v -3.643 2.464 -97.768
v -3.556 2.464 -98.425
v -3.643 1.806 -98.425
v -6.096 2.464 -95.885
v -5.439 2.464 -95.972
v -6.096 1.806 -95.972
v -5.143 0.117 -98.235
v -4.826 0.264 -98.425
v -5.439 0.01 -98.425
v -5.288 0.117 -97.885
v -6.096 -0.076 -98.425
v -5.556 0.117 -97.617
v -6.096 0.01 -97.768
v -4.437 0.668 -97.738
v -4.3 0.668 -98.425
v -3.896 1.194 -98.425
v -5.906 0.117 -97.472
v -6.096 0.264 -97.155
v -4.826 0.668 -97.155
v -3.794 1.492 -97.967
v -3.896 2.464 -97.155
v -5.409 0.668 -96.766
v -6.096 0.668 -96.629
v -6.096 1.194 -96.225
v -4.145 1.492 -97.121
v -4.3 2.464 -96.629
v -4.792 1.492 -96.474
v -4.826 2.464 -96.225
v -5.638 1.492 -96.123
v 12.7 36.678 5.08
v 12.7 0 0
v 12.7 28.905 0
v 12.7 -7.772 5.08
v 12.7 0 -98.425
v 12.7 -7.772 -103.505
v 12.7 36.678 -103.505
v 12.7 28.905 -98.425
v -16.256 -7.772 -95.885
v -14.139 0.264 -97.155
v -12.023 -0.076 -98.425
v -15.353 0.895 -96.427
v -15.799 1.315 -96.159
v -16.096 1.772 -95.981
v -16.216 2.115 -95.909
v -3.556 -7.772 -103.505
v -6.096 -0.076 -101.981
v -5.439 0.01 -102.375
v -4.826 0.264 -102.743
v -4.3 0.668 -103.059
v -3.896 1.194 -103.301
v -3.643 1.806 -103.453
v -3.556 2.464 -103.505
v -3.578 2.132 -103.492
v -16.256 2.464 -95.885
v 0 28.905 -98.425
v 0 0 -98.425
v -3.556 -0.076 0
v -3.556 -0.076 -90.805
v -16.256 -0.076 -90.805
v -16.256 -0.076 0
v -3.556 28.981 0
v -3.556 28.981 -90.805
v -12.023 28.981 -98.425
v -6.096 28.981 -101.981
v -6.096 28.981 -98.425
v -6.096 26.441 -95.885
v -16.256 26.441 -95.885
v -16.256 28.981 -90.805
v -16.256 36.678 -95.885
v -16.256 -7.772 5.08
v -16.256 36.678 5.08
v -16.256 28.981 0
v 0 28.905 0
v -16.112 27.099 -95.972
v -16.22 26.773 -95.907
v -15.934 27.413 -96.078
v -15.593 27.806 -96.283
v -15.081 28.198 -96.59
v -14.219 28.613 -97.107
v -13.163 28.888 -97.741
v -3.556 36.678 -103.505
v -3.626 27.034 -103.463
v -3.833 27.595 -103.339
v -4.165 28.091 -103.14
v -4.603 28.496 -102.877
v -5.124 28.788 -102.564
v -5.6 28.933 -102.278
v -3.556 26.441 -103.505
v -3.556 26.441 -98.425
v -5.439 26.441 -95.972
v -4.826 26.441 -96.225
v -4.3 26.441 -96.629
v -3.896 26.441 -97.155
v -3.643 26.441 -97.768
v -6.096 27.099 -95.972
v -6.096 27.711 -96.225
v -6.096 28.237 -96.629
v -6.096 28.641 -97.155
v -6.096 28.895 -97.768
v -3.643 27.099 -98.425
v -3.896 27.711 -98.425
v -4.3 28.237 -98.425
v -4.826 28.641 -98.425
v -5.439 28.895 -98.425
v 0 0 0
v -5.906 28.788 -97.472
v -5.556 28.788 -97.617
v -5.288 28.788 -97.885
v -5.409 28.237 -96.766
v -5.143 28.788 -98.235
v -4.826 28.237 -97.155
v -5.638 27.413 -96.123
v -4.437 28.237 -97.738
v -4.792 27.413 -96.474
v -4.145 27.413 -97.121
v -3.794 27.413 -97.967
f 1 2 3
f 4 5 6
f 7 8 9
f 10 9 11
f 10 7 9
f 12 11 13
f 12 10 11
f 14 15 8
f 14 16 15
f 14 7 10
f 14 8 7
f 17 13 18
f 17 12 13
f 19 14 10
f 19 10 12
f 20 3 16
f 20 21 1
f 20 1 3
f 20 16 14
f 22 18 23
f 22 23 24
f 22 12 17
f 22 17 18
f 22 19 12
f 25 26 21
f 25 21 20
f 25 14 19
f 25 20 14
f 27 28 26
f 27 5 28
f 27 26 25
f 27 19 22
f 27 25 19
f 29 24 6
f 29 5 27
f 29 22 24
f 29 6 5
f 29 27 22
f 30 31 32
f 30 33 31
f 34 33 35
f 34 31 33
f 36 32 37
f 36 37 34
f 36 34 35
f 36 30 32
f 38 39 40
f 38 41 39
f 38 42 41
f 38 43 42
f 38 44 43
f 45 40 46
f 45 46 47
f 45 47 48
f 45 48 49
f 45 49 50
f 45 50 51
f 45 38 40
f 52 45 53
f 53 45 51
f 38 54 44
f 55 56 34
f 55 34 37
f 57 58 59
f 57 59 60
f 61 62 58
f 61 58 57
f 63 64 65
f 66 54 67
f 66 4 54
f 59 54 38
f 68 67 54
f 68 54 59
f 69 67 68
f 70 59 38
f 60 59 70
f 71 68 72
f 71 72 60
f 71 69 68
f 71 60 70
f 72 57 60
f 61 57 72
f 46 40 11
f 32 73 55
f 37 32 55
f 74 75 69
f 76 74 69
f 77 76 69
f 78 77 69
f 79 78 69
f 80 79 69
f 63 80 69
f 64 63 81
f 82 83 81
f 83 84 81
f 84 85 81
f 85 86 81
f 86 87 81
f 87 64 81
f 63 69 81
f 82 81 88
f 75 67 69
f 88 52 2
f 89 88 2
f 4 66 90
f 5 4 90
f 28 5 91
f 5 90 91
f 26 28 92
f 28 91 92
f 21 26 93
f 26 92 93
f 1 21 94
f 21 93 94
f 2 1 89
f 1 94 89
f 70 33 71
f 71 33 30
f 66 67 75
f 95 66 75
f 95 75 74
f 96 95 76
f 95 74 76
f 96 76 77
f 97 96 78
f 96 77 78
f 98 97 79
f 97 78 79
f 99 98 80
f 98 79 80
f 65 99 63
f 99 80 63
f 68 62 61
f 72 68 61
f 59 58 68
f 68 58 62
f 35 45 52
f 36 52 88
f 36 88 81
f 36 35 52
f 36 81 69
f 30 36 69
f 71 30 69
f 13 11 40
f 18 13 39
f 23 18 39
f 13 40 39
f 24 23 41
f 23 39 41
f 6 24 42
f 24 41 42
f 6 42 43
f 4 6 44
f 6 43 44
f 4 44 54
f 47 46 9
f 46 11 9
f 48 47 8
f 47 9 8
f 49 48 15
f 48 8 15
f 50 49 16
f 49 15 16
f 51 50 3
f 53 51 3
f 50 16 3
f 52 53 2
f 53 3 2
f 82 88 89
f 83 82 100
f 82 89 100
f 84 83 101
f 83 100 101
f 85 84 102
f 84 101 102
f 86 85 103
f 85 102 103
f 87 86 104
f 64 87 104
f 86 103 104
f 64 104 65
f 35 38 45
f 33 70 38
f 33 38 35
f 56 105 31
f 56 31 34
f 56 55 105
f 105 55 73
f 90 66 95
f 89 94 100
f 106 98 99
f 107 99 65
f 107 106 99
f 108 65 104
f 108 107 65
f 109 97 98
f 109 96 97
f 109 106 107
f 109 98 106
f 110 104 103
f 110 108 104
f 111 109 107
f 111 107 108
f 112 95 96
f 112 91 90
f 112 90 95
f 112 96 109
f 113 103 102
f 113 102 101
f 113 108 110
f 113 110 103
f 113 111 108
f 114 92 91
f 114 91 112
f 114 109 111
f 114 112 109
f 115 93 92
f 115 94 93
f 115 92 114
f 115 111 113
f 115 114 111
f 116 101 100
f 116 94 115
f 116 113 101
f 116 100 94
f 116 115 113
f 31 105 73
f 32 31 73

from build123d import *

# Parameters (mm, degrees)
SKETCH4_W           = 108.585
SKETCH4_H           = 44.45
SKETCH4_W_2         = 98.425
SKETCH4_H_2         = 28.9052
BOSS_EXTRUDE2_DEPTH = 12.7
SKETCH5_W           = 108.585
SKETCH5_H           = 44.45
BOSS_EXTRUDE3_DEPTH = 3.556
SKETCH6_W           = 100.965
SKETCH6_H           = 44.45
SKETCH6_W_2         = 90.805
SKETCH6_H_2         = 29.0576
BOSS_EXTRUDE4_DEPTH = 12.7
BOSS_EXTRUDE6_DEPTH = 7.6962
BOSS_EXTRUDE7_DEPTH = 7.6962
FILLET1_R           = 2.54


with BuildPart() as part:
    # Sketch4 → Boss-Extrude2 (new body)
    with BuildSketch(Plane(origin=(0, 0, 0), x_dir=(0, 0, -1), z_dir=(1, 0, 0))):
        with Locations((49.2125, 14.4526)):
            Rectangle(SKETCH4_W, SKETCH4_H)
        with Locations((49.2125, 14.4526)):
            Rectangle(SKETCH4_W_2, SKETCH4_H_2, mode=Mode.SUBTRACT)
    extrude(amount=BOSS_EXTRUDE2_DEPTH)

    # Sketch5 → Boss-Extrude3 (add)
    with BuildSketch(Plane.ZY):
        with Locations((-49.2125, 14.4526)):
            Rectangle(SKETCH5_W, SKETCH5_H)
    extrude(amount=BOSS_EXTRUDE3_DEPTH)

    # Sketch6 → Boss-Extrude4 (add)
    with BuildSketch(Plane.ZY.offset(3.556)):
        with Locations((-45.4025, 14.4526)):
            Rectangle(SKETCH6_W, SKETCH6_H)
        with Locations((-45.4025, 14.4526)):
            Rectangle(SKETCH6_W_2, SKETCH6_H_2, mode=Mode.SUBTRACT)
    extrude(amount=BOSS_EXTRUDE4_DEPTH)

    # Sketch7 → Boss-Extrude6 (add)
    with BuildSketch(Plane(origin=(0, 36.6776, 0), x_dir=(1, 0, 0), z_dir=(0, 1, 0))):
        Polygon((-3.556, 103.505), (-3.556, 95.885), (-16.256, 95.885), align=None)
    extrude(amount=-BOSS_EXTRUDE6_DEPTH)

    # Sketch8 → Boss-Extrude7 (add)
    with BuildSketch(Plane.XZ.offset(7.7724)):
        Polygon((-3.556, -103.505), (-3.556, -95.885), (-16.256, -95.885), align=None)
    extrude(amount=-BOSS_EXTRUDE7_DEPTH)

    # Fillet1
    fillet1_edges = [part.edges().sort_by_distance(p)[0] for p in [
        (-3.556, 14.4526, -95.885),
        (-9.906, 28.9814, -95.885),
        (-3.556, 28.9814, -99.695),
        (-3.556, -0.0762, -99.695),
        (-9.906, -0.0762, -95.885),
    ]]
    fillet(fillet1_edges, radius=FILLET1_R)


solid = part.part
